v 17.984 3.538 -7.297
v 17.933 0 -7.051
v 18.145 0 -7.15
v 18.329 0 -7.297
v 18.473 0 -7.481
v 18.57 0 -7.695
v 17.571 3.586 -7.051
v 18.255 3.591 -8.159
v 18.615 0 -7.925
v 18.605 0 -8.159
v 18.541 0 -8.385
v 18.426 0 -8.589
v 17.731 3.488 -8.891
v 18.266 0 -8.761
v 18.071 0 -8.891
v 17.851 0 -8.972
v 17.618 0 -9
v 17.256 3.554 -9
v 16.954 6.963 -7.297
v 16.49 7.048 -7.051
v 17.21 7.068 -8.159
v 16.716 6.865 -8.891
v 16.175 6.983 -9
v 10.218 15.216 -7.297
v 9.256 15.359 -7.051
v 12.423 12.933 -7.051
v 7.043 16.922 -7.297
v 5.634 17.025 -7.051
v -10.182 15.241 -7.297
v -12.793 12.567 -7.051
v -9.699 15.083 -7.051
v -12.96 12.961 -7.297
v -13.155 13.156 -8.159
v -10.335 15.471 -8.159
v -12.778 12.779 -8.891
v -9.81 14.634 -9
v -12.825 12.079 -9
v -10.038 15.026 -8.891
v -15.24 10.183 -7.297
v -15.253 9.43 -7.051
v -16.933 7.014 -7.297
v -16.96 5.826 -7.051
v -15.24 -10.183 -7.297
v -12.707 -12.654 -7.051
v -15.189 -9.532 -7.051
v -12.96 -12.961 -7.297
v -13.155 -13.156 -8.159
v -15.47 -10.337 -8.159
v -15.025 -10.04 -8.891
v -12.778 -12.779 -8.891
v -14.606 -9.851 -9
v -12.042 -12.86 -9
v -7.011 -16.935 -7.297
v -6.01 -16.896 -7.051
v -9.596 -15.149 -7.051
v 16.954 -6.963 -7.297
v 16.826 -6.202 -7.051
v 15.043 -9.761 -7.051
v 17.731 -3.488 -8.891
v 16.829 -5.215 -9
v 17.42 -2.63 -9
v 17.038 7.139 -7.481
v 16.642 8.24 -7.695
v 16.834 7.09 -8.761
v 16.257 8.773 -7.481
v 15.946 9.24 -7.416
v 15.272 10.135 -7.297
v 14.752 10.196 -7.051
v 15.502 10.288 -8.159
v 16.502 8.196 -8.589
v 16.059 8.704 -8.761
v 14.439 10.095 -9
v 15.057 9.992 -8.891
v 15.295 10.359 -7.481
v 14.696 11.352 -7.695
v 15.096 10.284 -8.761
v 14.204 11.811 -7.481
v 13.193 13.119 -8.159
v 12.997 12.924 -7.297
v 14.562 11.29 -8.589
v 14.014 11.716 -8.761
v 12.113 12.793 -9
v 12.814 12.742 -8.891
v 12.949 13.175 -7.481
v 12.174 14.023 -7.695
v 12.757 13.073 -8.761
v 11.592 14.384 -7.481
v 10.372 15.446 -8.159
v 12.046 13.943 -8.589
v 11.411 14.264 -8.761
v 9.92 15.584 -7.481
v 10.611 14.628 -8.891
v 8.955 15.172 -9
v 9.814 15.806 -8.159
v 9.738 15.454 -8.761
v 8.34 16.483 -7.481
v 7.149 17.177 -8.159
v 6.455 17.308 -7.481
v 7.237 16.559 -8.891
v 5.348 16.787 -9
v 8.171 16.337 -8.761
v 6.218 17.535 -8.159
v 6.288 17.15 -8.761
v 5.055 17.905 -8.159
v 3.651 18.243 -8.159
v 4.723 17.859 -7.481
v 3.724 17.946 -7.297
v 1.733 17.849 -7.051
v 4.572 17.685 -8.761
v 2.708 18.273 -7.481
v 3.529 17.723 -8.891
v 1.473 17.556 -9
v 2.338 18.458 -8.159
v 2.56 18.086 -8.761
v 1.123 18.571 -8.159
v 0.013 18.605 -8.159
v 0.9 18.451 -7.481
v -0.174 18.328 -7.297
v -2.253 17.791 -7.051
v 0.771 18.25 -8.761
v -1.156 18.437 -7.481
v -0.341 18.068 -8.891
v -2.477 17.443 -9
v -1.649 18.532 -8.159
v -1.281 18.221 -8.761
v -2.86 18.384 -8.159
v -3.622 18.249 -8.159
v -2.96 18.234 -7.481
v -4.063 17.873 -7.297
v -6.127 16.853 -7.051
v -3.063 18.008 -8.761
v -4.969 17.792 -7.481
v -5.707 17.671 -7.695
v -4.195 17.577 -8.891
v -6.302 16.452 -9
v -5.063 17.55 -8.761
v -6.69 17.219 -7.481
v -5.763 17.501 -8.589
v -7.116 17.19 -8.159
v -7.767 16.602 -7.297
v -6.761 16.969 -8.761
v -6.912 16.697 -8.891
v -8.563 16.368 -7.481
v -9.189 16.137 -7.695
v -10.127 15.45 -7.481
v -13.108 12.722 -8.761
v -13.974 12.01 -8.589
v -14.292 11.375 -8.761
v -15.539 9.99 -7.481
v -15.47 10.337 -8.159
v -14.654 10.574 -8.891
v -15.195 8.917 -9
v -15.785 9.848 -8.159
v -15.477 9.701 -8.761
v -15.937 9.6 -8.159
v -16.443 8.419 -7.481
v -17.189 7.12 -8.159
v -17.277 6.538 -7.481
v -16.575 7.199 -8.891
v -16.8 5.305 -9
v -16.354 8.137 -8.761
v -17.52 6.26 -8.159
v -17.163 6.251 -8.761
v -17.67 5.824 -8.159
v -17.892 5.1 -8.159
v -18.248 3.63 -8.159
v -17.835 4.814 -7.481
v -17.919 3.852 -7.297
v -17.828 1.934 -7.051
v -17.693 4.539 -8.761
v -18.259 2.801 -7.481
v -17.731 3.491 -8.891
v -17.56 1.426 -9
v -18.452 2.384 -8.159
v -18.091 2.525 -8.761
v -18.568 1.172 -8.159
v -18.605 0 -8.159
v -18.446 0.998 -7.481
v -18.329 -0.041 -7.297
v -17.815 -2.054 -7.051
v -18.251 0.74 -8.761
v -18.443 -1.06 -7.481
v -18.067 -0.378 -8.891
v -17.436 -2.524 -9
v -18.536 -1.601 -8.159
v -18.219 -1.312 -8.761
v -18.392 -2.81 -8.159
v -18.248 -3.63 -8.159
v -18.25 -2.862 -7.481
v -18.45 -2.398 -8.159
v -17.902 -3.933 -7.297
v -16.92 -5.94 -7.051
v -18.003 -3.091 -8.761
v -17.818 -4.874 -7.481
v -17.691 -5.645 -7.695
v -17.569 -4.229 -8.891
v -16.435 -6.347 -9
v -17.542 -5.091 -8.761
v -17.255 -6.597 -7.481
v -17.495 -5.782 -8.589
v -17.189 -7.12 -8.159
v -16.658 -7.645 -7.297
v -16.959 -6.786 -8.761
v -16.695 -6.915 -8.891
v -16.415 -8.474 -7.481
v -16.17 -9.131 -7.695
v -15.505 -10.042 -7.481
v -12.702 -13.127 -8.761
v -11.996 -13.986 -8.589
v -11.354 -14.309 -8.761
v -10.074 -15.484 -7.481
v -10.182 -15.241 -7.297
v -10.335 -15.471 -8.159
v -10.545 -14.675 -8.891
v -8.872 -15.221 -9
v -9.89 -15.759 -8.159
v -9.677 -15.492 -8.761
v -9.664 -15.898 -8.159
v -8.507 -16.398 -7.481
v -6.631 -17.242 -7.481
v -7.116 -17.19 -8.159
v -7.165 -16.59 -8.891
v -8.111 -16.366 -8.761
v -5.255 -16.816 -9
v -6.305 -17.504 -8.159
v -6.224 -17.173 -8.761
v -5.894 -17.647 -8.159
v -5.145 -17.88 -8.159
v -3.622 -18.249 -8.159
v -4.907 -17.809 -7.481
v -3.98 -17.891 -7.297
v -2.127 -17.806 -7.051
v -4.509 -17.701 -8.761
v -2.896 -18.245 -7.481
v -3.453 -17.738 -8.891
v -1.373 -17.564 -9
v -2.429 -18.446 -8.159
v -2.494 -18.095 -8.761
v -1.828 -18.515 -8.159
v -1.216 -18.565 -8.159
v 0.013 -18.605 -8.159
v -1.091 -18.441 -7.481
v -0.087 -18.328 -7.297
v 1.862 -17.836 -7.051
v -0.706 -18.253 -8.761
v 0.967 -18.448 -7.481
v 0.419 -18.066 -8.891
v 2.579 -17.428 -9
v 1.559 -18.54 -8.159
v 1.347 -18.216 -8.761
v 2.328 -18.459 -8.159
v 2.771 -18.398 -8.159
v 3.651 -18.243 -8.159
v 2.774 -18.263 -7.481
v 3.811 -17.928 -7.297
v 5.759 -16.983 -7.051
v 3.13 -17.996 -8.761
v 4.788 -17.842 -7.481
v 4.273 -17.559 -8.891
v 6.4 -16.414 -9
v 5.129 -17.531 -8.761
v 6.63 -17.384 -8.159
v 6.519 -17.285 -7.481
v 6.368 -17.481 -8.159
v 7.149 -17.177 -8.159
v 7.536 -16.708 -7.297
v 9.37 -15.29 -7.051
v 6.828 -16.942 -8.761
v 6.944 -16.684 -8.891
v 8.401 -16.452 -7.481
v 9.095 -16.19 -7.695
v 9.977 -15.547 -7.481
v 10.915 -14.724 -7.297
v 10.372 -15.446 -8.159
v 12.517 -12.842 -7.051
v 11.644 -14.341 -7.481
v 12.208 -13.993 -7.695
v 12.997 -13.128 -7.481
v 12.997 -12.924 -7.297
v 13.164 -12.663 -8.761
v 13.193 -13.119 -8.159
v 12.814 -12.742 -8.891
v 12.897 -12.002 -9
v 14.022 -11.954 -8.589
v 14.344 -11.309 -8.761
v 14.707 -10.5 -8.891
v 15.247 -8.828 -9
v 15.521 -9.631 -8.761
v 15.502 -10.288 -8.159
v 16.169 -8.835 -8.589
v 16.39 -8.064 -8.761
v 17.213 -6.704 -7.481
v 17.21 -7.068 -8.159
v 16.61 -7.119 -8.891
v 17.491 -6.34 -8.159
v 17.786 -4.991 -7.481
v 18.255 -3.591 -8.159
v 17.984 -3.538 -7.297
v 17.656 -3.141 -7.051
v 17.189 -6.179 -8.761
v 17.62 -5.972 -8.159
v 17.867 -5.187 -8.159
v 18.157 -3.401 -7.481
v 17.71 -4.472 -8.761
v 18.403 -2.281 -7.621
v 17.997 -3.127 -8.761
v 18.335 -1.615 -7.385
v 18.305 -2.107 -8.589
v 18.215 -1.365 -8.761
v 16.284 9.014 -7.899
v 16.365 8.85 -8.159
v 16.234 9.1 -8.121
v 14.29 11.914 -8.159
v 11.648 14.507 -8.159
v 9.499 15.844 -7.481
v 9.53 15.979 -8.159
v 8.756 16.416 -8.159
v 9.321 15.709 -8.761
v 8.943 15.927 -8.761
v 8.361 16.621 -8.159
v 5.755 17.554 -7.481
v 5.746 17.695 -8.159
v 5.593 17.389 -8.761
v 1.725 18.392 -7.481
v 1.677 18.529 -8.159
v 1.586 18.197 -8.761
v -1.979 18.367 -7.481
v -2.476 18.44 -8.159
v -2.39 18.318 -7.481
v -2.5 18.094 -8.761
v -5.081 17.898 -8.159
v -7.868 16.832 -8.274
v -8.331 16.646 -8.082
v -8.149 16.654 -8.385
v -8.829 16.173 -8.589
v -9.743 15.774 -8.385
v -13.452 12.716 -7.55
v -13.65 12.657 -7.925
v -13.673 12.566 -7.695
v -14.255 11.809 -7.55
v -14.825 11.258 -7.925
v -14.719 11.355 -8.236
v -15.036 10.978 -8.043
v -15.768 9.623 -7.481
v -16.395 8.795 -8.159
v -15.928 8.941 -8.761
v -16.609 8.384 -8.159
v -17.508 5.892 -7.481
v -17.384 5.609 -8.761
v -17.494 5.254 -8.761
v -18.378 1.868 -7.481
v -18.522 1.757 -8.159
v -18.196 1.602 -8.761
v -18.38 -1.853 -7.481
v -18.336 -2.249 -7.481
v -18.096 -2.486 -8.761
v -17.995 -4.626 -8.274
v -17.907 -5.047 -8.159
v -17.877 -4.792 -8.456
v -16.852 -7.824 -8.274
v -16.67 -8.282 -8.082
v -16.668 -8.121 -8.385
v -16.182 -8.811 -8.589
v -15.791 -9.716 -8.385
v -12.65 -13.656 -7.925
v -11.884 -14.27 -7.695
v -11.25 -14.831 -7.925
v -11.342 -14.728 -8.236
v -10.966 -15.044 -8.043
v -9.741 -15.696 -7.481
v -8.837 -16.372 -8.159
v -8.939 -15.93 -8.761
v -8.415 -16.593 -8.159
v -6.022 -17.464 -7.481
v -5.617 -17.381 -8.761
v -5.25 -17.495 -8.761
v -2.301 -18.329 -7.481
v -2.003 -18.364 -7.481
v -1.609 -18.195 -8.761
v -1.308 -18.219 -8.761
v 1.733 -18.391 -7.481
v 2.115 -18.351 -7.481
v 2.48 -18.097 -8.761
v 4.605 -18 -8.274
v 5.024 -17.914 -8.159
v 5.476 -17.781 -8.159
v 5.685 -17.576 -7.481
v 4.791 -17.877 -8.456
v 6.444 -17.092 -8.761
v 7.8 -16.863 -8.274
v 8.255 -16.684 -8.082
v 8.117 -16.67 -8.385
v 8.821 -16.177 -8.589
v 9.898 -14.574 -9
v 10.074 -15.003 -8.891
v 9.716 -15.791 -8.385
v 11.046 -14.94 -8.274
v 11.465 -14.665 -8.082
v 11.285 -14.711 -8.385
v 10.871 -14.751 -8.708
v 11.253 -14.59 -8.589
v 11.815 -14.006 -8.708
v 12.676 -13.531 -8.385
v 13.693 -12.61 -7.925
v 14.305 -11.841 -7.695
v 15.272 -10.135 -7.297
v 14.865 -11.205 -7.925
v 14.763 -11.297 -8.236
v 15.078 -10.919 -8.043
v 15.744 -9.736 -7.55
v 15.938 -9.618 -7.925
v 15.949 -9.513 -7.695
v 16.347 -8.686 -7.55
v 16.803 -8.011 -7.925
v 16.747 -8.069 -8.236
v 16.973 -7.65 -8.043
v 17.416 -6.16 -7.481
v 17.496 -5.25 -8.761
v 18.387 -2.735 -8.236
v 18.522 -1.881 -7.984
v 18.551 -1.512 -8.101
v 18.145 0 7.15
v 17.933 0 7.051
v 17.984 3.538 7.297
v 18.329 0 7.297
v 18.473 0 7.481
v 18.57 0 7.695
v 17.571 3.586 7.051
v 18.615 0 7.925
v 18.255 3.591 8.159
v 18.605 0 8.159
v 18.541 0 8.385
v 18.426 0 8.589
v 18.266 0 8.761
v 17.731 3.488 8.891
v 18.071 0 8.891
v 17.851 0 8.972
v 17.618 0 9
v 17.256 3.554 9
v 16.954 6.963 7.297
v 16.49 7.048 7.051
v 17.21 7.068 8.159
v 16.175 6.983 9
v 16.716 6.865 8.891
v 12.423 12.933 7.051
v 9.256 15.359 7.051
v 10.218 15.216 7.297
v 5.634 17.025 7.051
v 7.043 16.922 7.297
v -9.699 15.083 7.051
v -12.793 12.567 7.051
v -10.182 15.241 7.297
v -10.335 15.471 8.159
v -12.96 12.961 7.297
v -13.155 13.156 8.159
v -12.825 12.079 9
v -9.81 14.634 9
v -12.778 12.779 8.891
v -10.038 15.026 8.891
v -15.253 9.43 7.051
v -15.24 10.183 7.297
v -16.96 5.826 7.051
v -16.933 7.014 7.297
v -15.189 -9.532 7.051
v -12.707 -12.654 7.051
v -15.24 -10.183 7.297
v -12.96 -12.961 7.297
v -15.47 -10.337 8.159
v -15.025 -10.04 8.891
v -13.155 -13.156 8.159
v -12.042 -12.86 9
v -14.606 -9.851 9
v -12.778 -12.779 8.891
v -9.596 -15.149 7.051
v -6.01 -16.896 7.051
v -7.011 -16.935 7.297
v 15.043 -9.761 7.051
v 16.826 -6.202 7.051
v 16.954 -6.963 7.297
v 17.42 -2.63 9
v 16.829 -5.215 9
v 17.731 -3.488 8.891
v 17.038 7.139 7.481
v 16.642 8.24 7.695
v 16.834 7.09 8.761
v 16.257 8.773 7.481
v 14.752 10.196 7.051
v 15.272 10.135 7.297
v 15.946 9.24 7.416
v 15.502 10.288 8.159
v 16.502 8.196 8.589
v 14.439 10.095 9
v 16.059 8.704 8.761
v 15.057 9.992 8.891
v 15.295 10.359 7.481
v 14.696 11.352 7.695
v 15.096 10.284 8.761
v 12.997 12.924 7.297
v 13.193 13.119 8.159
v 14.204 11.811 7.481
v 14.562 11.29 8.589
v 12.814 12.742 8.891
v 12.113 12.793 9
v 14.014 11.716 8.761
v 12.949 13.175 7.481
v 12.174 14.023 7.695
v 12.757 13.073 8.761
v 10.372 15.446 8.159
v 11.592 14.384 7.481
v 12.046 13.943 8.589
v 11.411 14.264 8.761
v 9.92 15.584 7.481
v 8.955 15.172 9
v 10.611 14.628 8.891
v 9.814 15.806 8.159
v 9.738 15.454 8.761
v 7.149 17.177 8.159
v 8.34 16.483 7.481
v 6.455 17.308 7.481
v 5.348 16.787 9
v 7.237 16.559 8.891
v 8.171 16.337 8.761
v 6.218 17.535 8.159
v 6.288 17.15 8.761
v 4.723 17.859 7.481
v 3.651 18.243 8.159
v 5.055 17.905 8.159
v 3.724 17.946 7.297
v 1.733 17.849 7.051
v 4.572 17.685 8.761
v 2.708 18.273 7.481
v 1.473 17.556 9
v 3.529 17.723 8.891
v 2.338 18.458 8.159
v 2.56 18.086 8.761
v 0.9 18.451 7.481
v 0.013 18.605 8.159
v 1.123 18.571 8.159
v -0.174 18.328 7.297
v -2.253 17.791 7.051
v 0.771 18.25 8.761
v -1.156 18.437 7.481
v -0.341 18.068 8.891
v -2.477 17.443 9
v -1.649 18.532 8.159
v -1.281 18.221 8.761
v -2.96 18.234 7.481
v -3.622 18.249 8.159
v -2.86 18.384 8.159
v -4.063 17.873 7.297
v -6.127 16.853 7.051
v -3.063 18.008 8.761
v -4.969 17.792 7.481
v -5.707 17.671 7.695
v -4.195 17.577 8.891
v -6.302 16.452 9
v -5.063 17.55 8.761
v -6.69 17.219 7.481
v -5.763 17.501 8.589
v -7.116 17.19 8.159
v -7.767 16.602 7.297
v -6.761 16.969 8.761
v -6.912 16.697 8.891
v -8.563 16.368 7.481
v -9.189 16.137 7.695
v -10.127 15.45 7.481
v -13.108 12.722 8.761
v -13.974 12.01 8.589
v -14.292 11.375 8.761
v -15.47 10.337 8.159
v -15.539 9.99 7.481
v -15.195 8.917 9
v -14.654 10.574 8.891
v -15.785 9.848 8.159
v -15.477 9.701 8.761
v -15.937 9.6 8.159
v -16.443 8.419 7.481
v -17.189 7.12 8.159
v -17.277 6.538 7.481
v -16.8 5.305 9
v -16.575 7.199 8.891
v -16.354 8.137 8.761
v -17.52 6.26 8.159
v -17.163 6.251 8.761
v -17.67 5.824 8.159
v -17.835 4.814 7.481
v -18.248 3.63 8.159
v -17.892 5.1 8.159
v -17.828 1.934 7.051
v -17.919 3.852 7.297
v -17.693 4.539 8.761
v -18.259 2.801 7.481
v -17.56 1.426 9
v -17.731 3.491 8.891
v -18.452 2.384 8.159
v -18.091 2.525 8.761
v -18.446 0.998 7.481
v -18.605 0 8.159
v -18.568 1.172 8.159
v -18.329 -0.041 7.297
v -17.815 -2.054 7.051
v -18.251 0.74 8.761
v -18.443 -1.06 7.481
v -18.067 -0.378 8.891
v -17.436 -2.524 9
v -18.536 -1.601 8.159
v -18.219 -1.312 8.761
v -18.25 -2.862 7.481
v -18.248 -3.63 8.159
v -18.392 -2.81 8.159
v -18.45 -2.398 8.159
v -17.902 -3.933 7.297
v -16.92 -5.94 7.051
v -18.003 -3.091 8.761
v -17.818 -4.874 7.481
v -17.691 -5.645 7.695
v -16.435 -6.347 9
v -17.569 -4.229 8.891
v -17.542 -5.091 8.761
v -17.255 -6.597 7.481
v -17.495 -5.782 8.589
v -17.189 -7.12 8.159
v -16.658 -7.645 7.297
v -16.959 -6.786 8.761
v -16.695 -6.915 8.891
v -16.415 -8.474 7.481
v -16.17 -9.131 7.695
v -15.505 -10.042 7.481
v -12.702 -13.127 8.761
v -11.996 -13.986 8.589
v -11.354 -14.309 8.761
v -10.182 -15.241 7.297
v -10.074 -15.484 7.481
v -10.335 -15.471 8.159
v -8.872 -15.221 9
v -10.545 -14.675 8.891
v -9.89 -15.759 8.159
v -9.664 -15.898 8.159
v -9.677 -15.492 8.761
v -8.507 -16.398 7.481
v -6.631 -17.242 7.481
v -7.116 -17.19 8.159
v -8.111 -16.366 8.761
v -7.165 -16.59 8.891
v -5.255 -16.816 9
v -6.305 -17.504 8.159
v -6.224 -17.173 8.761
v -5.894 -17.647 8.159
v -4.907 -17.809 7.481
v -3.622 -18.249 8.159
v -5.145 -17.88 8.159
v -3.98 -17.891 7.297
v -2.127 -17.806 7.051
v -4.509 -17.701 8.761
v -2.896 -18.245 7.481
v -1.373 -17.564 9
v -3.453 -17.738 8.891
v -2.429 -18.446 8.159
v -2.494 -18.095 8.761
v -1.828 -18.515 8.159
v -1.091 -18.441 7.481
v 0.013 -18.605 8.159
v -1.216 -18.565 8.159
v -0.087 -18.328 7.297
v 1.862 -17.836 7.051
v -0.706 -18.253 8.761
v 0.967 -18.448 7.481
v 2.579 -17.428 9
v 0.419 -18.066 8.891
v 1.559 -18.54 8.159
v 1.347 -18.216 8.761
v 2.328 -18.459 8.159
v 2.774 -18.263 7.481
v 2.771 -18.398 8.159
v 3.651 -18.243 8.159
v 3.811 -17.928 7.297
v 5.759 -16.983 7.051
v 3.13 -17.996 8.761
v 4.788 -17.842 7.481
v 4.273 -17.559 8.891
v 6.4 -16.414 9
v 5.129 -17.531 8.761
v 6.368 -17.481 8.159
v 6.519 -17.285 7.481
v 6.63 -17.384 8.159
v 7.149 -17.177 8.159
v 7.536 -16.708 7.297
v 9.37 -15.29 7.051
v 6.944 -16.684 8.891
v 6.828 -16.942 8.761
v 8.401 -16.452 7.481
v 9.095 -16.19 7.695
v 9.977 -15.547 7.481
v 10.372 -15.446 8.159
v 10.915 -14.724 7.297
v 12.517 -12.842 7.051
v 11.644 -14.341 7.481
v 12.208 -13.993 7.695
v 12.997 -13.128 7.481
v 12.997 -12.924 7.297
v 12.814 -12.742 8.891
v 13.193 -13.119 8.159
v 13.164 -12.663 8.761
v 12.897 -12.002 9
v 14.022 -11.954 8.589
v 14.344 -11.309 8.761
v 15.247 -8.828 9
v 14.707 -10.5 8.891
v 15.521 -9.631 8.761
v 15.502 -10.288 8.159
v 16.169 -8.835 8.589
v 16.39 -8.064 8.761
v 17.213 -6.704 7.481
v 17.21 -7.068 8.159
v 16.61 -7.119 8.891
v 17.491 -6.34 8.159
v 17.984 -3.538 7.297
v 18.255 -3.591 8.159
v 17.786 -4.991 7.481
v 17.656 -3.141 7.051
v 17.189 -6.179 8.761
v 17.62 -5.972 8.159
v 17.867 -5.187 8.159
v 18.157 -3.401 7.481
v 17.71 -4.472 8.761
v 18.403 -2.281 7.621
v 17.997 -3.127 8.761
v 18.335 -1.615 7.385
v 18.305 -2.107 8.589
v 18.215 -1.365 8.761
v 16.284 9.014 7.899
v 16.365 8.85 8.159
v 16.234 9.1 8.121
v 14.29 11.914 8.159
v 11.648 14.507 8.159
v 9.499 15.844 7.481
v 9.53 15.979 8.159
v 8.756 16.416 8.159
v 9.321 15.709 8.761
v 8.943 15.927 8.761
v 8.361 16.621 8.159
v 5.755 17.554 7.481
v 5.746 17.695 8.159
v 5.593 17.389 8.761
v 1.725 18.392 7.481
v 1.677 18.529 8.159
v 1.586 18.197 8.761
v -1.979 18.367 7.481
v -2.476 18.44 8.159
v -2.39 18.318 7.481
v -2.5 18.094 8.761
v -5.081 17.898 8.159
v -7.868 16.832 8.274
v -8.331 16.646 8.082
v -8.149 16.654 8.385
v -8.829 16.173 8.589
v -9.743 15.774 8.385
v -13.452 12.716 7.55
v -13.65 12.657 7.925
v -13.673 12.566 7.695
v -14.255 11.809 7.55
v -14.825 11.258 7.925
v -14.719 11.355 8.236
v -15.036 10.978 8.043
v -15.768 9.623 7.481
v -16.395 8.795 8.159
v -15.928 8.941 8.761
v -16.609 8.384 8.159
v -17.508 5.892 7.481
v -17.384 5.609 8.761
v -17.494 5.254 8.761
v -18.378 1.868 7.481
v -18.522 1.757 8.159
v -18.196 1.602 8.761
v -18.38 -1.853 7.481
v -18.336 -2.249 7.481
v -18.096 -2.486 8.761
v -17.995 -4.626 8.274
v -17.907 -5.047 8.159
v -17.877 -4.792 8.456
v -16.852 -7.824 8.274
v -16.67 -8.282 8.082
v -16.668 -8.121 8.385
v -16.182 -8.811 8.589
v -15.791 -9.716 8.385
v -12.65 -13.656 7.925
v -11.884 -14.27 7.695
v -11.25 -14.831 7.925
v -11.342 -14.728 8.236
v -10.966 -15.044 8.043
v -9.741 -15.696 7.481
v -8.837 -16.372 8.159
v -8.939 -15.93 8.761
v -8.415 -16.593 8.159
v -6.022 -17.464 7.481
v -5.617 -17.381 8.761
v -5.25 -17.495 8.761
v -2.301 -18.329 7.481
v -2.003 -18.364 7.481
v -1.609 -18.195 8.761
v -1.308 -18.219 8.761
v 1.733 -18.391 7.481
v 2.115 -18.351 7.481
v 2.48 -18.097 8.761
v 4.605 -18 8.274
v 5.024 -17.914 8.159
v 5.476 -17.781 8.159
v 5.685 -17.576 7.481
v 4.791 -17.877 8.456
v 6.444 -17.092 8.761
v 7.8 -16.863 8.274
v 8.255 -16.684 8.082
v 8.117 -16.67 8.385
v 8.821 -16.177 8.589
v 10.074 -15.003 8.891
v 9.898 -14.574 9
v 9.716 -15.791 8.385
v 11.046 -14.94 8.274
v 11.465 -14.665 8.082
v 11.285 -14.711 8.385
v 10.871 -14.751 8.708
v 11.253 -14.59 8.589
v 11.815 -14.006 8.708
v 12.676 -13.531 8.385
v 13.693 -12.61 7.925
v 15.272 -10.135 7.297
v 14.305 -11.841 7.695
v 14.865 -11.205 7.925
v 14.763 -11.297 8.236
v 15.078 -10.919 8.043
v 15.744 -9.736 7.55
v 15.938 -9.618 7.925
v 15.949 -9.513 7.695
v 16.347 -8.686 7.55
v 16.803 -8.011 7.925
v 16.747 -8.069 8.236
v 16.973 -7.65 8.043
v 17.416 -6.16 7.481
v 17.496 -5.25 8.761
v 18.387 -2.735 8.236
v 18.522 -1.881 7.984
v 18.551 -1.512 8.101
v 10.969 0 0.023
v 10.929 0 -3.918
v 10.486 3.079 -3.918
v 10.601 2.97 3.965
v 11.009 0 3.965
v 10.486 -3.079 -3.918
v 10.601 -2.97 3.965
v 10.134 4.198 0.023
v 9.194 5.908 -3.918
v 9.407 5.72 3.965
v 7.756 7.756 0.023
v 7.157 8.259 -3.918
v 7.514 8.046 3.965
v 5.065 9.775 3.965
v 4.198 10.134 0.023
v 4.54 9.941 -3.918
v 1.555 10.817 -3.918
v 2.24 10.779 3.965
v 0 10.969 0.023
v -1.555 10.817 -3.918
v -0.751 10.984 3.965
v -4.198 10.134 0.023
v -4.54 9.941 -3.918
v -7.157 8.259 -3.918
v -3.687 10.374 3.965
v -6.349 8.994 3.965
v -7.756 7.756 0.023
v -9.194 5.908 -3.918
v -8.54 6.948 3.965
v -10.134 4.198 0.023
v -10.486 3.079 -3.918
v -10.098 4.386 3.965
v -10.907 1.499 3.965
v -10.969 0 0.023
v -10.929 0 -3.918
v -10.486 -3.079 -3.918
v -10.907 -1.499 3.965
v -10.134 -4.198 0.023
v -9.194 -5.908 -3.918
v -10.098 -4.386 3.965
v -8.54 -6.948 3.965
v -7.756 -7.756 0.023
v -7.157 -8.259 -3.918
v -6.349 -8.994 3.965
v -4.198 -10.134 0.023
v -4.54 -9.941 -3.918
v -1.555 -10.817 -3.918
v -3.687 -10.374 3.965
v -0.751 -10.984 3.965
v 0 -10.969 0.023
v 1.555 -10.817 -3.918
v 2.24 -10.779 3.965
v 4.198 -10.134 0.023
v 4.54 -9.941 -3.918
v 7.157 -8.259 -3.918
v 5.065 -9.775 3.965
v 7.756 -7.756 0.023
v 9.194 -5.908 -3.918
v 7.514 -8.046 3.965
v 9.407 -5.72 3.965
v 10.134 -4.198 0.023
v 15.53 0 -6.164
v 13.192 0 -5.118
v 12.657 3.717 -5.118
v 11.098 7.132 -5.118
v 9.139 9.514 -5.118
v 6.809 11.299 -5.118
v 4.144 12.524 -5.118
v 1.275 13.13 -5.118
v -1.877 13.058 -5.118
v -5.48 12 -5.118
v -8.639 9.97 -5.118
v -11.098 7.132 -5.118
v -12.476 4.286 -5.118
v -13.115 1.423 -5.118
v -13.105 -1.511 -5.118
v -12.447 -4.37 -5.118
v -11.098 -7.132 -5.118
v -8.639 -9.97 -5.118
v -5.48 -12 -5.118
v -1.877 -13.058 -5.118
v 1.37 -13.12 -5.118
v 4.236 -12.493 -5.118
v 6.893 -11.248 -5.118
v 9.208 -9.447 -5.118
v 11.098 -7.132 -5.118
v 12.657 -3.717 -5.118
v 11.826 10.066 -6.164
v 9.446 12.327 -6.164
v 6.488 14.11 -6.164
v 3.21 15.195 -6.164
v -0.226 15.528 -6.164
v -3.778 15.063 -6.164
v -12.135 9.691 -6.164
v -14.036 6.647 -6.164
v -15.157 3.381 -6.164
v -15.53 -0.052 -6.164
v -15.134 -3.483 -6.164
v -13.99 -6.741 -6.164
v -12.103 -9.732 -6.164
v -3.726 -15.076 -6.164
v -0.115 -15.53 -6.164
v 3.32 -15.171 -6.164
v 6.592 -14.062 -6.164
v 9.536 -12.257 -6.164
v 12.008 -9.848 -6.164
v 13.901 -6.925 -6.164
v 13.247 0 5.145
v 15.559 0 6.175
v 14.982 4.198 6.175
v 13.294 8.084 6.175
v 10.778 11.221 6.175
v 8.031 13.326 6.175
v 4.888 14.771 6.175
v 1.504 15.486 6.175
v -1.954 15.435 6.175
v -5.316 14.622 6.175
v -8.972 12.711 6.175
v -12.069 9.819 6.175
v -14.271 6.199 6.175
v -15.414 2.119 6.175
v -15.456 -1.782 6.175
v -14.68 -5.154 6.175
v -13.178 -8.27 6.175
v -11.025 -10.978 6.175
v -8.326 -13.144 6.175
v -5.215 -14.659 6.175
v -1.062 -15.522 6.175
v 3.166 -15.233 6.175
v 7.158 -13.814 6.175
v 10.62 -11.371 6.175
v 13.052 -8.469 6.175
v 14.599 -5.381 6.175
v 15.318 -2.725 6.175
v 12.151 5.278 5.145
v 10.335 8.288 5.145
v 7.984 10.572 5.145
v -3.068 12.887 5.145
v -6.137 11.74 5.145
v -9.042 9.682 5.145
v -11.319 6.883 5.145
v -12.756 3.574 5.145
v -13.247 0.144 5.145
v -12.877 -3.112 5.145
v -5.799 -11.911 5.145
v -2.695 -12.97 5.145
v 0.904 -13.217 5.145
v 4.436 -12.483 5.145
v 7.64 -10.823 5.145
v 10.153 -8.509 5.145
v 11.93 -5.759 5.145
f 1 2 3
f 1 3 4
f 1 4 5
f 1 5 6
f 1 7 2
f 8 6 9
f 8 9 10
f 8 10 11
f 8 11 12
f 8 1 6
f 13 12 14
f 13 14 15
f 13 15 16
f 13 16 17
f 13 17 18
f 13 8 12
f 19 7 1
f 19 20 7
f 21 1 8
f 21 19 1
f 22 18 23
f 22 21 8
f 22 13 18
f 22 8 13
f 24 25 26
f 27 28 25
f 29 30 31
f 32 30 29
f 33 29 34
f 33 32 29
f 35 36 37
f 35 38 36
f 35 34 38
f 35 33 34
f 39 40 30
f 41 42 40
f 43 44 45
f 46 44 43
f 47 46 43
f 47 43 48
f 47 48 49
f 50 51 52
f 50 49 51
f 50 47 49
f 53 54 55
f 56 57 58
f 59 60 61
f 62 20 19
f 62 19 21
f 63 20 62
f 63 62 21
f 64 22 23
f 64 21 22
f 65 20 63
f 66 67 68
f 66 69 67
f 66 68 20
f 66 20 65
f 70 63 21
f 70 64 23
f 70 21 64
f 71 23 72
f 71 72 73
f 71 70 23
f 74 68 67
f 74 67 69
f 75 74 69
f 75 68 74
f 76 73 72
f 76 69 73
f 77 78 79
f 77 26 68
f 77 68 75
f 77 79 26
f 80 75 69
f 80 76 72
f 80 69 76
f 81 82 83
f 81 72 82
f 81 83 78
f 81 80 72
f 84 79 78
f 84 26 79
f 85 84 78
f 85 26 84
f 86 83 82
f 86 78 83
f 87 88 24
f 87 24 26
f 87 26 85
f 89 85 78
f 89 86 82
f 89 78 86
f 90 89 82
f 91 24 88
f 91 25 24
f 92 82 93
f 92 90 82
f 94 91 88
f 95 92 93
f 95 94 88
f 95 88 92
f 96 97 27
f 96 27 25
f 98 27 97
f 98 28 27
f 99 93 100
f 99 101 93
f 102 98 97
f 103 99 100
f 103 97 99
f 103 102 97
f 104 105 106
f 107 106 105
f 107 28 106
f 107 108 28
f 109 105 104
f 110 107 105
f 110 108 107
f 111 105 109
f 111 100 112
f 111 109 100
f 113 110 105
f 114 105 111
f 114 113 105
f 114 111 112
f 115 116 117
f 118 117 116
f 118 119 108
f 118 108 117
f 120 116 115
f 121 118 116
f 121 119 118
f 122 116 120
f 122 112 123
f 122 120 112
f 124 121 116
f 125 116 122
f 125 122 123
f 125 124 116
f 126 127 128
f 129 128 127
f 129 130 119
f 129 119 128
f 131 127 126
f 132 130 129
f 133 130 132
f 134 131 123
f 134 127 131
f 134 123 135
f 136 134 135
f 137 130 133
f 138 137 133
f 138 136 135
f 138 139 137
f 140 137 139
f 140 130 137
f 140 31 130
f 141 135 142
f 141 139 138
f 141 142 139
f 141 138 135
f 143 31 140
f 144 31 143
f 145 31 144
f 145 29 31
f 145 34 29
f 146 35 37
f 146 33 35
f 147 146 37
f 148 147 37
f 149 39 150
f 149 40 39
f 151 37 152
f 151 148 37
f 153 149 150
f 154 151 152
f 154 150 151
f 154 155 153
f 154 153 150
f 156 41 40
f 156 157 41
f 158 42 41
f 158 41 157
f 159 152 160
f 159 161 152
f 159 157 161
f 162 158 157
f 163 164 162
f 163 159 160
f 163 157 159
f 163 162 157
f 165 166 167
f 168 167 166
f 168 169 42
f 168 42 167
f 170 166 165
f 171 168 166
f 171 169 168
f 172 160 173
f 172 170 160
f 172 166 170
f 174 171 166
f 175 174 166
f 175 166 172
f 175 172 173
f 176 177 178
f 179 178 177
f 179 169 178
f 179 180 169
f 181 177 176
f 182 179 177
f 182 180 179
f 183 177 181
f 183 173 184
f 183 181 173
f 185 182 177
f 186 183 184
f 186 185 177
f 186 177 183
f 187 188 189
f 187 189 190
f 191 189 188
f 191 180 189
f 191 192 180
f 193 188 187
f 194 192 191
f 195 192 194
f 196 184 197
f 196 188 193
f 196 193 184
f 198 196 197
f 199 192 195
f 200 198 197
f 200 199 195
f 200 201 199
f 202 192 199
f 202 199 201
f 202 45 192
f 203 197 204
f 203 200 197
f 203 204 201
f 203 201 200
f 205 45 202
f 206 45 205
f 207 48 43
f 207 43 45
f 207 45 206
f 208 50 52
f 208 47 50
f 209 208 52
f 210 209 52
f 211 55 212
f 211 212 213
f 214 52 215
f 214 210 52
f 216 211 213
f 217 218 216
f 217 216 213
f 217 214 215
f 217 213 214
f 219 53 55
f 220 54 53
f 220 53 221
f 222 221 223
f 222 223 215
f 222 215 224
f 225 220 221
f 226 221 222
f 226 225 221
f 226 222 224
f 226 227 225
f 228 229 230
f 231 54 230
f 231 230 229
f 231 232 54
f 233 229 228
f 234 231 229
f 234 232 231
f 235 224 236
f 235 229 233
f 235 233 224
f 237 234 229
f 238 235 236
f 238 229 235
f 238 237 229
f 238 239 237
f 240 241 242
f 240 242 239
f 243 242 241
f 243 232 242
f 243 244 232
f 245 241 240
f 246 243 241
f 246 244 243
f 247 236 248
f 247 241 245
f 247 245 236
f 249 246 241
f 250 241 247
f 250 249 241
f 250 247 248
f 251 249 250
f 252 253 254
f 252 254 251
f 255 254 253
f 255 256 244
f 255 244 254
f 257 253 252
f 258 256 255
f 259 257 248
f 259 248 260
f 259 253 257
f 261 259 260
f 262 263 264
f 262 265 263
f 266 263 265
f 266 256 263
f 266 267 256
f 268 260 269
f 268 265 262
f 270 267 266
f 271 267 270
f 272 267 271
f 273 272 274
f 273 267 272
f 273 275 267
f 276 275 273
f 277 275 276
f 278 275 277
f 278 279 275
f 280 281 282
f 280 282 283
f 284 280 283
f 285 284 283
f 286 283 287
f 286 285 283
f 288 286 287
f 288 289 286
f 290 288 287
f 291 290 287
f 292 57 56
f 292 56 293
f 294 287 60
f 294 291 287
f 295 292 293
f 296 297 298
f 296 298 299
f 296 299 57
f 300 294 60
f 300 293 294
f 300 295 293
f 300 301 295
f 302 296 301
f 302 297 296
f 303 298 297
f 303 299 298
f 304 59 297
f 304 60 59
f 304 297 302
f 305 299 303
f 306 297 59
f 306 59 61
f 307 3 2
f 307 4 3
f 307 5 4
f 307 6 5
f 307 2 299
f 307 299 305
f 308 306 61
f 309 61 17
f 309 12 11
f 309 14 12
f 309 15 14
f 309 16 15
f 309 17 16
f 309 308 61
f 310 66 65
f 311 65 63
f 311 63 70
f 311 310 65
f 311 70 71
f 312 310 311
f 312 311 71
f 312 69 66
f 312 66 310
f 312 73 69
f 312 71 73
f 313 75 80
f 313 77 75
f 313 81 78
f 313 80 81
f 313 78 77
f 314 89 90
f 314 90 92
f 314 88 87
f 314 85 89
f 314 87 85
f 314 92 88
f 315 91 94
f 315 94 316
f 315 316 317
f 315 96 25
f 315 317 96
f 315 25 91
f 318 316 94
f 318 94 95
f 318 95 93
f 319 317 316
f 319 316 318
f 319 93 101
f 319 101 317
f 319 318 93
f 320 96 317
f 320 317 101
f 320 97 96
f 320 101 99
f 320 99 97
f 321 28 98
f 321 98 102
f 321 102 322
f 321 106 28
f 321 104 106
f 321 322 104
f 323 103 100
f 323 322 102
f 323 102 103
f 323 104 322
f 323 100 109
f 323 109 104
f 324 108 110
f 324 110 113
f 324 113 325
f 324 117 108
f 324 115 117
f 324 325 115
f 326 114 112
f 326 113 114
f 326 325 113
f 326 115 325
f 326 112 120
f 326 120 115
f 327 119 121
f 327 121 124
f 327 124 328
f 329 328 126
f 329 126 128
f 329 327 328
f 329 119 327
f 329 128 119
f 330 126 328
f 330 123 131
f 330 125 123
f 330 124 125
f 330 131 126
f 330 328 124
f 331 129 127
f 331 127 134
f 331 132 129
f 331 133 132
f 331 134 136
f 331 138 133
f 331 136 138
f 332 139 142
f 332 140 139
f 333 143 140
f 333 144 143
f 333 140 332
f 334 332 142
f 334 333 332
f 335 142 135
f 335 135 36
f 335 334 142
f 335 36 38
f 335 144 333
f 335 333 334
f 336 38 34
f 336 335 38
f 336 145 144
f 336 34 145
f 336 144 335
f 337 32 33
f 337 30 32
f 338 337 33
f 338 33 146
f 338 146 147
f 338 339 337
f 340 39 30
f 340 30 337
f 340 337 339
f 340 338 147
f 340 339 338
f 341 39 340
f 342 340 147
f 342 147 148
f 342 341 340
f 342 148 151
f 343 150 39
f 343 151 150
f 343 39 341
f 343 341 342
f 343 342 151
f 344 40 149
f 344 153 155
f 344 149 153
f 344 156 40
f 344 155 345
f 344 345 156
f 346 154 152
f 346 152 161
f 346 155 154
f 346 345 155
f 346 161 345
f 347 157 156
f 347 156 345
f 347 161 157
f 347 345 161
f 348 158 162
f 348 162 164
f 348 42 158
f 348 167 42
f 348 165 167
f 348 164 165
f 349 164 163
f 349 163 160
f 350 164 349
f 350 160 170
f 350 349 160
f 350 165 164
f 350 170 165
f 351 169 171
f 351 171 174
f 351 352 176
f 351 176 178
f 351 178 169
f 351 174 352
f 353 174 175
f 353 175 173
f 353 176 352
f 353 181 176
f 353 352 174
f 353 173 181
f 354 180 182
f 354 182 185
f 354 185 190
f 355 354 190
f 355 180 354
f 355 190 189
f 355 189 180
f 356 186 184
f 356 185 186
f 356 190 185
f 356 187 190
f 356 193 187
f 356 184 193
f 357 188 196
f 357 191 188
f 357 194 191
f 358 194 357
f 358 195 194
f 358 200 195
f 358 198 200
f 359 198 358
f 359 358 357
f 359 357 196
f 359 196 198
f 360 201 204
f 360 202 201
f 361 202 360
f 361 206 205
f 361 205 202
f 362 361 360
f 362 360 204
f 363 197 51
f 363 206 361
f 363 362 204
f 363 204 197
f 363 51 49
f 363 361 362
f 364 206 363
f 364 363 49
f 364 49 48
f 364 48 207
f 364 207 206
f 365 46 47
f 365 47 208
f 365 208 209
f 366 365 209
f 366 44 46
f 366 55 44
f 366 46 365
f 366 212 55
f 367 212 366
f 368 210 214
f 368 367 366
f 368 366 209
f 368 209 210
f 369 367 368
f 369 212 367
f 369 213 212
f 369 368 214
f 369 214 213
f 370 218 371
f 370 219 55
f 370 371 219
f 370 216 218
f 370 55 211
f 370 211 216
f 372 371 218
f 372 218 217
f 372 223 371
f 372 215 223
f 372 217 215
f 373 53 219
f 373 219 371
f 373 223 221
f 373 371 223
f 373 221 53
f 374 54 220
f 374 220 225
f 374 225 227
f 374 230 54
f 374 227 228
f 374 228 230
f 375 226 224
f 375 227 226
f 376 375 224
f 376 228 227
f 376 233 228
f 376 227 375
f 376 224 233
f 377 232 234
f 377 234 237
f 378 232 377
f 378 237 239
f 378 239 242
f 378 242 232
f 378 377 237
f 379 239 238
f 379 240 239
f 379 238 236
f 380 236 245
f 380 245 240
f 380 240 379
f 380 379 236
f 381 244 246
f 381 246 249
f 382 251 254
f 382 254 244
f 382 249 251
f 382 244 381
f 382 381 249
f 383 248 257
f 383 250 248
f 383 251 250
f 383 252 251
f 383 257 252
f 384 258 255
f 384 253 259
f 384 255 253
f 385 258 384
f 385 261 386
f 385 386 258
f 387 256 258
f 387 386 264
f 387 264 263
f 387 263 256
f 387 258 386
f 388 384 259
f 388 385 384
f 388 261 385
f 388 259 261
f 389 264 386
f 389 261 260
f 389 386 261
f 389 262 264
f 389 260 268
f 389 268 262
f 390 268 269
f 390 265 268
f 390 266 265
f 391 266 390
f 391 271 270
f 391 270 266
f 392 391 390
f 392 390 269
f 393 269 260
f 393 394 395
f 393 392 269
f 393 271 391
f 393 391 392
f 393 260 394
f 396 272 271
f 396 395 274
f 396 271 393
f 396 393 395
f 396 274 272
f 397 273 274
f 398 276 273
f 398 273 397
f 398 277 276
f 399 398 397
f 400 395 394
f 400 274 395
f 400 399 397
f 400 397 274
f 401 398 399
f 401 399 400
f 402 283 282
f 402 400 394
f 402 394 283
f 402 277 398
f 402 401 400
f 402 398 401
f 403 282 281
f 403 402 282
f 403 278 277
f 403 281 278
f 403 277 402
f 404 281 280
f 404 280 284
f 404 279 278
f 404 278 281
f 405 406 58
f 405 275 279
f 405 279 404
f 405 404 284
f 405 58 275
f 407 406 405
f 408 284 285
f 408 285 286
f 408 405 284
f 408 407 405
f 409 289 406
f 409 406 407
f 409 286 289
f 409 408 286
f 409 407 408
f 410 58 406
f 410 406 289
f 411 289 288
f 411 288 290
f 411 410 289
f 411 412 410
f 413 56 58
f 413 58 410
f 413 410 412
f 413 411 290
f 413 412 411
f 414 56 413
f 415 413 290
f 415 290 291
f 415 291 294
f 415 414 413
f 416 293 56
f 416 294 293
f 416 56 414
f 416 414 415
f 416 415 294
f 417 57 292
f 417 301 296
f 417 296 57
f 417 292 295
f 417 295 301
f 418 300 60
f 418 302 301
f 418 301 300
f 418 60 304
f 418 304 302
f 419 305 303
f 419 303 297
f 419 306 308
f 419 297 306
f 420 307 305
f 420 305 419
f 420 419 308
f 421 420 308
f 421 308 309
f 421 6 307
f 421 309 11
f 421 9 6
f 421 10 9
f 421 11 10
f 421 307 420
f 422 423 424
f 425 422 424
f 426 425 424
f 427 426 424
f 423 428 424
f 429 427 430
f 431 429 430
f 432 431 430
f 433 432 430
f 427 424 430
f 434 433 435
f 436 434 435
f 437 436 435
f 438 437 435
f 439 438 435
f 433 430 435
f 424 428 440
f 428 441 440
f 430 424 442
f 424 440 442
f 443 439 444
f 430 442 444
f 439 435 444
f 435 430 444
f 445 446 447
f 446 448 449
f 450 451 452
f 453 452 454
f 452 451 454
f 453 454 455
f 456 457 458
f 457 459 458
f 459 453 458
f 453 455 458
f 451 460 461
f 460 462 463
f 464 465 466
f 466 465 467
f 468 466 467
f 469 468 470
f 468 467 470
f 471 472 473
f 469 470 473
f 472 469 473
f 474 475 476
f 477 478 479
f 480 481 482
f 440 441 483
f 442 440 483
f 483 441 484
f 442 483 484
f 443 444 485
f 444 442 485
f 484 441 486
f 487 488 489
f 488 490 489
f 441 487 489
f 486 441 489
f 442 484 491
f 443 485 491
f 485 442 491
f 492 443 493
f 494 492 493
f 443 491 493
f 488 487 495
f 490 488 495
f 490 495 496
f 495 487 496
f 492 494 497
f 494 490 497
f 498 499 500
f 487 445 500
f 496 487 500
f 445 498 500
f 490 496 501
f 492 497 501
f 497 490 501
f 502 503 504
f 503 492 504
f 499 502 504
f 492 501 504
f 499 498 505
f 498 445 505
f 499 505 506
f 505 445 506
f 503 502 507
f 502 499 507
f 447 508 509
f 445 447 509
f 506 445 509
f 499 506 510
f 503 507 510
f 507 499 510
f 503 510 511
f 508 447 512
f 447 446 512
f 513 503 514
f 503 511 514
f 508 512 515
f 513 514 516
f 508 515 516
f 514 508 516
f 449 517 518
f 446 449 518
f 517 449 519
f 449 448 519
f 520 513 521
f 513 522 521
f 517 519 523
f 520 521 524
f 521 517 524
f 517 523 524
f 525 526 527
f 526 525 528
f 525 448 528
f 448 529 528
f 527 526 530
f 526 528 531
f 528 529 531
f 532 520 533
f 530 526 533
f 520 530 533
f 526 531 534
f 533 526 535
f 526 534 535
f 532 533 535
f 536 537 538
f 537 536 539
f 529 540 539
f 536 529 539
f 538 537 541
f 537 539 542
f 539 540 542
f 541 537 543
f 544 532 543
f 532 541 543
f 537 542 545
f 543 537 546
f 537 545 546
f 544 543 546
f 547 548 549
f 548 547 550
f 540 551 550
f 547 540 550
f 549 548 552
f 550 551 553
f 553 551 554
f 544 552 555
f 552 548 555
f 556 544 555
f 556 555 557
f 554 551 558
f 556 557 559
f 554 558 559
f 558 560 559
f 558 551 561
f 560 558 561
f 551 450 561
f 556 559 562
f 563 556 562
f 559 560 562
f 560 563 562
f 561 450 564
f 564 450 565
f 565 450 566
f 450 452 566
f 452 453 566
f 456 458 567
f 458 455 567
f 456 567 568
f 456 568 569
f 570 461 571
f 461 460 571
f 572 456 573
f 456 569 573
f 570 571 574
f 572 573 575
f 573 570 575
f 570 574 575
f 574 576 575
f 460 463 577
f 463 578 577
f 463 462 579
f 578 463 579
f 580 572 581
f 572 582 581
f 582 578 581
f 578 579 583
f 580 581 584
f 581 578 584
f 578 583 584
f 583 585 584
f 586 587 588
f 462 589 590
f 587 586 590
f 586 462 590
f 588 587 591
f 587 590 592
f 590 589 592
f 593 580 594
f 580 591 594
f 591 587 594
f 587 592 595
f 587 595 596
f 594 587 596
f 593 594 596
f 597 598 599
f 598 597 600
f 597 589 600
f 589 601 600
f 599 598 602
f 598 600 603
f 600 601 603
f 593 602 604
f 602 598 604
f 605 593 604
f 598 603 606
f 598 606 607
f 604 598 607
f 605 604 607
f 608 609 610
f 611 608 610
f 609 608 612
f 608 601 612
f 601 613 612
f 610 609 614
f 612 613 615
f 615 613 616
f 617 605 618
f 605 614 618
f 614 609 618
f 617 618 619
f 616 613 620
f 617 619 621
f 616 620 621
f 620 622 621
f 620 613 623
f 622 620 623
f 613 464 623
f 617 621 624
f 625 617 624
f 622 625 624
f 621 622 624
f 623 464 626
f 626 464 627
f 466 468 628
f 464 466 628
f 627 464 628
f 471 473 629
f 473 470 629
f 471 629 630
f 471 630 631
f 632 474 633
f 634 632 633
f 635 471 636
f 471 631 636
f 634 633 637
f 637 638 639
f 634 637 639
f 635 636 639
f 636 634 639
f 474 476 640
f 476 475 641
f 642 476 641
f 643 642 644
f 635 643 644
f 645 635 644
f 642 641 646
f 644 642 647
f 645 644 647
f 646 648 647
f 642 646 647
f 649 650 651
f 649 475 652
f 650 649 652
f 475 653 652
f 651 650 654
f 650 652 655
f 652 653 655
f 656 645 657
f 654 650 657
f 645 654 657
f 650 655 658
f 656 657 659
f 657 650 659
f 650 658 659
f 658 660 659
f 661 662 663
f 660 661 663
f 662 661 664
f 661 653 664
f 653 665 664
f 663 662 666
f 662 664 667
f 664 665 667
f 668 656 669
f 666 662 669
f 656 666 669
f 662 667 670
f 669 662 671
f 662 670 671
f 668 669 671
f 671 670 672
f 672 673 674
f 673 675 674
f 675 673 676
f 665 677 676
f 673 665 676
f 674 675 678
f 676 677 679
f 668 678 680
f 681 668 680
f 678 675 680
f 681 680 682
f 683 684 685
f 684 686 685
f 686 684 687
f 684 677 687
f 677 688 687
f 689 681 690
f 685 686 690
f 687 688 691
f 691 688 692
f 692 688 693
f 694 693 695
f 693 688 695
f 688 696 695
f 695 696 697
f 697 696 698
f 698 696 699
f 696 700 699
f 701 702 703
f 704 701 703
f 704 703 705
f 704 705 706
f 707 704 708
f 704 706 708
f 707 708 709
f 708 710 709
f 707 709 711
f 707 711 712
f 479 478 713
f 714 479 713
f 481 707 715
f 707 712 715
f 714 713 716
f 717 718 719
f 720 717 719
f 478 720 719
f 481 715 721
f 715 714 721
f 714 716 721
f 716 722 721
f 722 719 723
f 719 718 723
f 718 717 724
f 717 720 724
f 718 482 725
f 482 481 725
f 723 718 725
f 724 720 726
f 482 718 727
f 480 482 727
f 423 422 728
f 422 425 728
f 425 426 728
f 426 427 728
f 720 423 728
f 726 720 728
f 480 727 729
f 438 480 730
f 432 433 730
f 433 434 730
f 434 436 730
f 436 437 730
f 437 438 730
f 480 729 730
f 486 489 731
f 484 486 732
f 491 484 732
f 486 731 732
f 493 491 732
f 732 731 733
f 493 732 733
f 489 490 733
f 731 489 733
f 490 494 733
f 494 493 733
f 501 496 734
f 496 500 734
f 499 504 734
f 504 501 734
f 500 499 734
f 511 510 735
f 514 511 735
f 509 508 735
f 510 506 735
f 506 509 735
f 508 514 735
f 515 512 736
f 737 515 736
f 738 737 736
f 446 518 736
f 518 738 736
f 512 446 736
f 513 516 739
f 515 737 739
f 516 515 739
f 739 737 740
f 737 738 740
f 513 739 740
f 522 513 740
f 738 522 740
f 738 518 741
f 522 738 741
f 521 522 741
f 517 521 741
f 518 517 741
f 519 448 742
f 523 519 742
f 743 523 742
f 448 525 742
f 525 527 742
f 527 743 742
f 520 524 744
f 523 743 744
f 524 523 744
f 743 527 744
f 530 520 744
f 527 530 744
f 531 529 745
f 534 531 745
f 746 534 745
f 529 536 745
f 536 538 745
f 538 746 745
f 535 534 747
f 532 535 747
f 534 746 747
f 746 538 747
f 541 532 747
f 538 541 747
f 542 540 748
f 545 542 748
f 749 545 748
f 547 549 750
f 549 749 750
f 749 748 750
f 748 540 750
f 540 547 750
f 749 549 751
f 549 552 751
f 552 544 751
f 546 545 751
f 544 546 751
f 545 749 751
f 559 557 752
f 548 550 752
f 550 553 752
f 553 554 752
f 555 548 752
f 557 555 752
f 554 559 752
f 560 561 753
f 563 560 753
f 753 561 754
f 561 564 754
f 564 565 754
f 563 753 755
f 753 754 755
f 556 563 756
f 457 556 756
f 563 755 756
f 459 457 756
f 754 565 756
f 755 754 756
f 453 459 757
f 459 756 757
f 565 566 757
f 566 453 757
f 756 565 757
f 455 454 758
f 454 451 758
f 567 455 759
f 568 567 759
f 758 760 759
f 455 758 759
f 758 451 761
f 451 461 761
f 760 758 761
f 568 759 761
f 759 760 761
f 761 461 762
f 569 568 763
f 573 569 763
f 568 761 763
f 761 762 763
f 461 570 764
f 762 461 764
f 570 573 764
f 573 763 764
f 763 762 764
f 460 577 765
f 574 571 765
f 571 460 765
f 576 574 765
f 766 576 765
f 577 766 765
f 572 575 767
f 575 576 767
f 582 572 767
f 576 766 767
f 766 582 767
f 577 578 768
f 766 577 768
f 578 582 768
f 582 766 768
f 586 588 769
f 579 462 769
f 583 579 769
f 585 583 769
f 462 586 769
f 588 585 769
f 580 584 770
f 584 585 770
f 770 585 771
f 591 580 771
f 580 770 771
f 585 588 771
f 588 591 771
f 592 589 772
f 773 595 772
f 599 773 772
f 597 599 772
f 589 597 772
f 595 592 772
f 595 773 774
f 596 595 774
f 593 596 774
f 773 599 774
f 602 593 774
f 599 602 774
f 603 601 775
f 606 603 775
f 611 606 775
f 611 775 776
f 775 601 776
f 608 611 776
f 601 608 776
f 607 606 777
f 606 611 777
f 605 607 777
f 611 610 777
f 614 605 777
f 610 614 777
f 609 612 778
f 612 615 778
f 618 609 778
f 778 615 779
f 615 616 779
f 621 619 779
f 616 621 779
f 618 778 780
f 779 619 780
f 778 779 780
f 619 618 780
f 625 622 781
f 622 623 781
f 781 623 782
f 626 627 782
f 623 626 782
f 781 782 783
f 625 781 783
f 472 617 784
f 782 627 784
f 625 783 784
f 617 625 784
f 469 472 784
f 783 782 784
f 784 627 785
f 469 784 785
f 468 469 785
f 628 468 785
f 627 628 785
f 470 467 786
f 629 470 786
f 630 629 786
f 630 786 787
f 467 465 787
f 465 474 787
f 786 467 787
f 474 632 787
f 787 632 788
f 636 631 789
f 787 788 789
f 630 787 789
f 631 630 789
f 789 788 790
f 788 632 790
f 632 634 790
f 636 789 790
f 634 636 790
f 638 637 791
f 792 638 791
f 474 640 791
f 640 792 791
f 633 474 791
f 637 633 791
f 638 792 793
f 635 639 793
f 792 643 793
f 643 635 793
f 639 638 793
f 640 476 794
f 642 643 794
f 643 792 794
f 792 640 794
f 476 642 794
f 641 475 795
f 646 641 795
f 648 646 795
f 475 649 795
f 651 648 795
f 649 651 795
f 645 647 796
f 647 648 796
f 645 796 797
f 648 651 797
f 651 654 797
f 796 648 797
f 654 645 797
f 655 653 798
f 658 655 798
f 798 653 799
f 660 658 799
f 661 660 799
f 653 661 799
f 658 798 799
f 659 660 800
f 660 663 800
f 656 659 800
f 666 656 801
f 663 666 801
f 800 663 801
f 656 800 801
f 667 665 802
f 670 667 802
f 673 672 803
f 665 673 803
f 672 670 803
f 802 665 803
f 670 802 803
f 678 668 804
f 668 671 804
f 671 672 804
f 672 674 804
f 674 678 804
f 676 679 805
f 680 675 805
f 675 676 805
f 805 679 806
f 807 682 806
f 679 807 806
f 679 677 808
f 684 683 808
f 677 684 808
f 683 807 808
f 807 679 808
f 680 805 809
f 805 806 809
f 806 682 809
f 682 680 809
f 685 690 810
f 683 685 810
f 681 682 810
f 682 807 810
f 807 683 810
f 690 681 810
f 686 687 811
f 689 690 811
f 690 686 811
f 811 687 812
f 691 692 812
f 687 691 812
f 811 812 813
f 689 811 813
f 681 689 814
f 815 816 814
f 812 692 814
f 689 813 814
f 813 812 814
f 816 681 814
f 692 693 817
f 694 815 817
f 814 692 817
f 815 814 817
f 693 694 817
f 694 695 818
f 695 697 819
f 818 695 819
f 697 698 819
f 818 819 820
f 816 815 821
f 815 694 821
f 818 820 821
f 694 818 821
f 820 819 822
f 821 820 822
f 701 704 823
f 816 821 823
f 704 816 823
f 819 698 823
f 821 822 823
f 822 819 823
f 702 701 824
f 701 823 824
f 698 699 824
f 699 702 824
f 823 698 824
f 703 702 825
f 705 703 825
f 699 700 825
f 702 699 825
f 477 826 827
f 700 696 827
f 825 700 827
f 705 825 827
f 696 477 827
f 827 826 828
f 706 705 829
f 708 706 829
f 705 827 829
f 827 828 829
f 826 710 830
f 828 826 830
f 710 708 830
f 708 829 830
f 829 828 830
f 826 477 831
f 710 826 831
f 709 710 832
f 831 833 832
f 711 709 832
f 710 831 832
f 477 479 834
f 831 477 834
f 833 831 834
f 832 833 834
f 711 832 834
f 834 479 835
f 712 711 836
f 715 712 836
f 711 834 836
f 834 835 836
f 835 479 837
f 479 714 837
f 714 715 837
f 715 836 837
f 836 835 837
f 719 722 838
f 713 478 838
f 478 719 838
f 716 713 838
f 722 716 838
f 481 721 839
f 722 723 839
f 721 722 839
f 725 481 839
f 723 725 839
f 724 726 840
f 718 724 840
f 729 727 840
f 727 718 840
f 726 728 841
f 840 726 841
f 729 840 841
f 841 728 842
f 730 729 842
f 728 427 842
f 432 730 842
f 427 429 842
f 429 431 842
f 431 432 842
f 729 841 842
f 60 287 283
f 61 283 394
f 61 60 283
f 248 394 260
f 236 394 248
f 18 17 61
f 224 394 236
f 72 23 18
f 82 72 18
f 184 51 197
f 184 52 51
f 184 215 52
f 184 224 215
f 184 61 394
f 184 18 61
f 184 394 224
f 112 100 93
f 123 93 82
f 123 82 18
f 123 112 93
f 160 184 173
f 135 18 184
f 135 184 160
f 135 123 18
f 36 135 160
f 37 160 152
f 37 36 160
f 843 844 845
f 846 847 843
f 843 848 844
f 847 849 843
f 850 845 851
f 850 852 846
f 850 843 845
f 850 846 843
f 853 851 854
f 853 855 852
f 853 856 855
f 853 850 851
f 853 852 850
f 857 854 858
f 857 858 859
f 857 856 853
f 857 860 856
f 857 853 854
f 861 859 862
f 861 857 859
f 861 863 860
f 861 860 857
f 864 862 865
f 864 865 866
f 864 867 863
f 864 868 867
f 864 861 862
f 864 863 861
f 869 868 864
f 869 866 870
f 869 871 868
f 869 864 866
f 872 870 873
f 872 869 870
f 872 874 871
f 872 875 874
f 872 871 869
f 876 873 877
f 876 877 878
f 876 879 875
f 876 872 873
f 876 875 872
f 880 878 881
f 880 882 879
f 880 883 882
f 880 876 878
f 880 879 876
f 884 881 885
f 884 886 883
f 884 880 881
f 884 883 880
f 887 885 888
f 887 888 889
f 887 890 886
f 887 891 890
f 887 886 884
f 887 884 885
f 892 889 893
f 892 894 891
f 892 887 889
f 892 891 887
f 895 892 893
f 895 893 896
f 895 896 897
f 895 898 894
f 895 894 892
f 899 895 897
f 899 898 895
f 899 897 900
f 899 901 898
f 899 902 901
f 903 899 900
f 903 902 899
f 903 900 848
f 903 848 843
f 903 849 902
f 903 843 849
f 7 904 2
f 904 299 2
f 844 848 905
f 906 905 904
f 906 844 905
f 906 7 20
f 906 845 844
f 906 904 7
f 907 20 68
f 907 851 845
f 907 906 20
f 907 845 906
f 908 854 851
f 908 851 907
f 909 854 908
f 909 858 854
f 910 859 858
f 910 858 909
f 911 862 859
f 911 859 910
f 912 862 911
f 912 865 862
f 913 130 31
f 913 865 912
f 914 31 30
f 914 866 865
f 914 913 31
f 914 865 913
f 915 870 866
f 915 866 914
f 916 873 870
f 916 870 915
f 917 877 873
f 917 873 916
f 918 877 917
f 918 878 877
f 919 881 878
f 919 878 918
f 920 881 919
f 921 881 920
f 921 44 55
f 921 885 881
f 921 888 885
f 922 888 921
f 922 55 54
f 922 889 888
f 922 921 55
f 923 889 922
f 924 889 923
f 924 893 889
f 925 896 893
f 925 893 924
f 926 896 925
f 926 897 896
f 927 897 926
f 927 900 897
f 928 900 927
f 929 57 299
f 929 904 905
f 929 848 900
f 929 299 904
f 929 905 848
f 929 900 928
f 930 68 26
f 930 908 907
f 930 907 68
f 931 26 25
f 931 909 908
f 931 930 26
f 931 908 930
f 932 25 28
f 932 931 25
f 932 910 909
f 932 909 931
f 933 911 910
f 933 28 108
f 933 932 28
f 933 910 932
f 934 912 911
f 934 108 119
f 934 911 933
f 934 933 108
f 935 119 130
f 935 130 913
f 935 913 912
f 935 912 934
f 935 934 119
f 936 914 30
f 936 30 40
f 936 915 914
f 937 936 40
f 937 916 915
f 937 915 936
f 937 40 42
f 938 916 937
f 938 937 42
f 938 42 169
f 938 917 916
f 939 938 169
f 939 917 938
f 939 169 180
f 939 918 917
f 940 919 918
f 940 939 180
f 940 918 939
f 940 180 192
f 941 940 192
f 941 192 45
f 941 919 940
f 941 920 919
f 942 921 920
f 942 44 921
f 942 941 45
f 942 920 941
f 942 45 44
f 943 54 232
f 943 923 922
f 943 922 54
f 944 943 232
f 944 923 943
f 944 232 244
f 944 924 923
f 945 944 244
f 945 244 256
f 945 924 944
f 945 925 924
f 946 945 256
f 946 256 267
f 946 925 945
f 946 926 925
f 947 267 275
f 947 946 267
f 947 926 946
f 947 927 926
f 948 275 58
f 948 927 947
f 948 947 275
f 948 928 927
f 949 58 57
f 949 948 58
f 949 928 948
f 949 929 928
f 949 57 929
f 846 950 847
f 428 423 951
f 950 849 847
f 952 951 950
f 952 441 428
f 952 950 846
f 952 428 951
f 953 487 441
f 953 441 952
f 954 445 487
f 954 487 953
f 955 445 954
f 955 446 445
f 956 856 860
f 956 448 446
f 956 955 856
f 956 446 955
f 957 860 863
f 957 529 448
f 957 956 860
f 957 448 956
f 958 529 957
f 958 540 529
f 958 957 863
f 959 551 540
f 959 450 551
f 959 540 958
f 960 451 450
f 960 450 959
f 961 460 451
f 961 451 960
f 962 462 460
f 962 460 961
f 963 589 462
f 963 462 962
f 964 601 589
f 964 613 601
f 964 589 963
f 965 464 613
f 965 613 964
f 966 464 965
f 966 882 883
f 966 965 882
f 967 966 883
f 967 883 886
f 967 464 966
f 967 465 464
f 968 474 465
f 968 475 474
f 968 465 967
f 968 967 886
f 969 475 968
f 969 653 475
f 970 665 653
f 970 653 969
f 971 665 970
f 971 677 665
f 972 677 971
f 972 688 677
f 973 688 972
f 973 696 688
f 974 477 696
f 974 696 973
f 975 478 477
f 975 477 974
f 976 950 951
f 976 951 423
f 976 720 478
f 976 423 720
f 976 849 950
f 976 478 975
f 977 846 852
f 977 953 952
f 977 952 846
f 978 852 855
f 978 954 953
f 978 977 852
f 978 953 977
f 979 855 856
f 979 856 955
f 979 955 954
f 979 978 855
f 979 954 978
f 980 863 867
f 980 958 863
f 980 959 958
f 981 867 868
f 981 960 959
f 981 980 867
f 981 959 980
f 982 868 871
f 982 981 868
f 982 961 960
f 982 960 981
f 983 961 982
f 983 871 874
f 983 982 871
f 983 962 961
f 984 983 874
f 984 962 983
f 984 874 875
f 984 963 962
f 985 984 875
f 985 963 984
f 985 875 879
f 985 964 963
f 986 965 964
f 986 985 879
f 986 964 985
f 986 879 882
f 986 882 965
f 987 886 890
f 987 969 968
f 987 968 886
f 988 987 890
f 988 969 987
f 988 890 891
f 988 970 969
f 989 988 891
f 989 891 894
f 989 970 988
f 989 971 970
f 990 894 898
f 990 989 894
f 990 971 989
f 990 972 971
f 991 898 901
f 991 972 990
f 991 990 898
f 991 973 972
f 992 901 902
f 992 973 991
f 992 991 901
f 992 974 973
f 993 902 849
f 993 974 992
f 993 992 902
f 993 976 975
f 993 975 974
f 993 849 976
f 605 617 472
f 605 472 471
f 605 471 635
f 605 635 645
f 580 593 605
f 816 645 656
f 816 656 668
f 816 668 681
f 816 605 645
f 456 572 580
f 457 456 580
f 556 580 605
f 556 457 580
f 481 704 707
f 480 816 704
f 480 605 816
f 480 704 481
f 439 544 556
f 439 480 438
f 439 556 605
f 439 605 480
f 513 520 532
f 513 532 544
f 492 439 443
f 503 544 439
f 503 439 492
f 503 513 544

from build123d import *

# Parameters (mm, degrees)
F2_R = 1
F3_R = 1


with BuildPart() as f1:
    # F0 (on Front) → F1 (revolve)
    with BuildSketch(Plane.XZ):
        with BuildLine():
            Line((0, 9), (0, 0))
            Line((0, 0), (0, -9))
            Line((0, -9), (30, -9))
            ThreePointArc((30, -9), (20.1316432931, -7.7078421856), (10.9286567668, -3.9184919894))
            Line((10.9286567668, -3.9184919894), (11.0093392432, 3.9646429941))
            ThreePointArc((11.0093392432, 3.9646429941), (20.1765584422, 7.7197805473), (30, 9))
            Line((30, 9), (0, 9))
        make_face()
    revolve(axis=Axis((0, 0, 4.5), (0, 0, 1)))

    # F2
    f2_edges = [f1.edges().sort_by_distance(p)[0] for p in [
        (-30, 0, 9),
    ]]
    fillet(f2_edges, radius=F2_R)

    # F3
    f3_edges = [f1.edges().sort_by_distance(p)[0] for p in [
        (-30, 0, -9),
    ]]
    fillet(f3_edges, radius=F3_R)


solid = f1.part
